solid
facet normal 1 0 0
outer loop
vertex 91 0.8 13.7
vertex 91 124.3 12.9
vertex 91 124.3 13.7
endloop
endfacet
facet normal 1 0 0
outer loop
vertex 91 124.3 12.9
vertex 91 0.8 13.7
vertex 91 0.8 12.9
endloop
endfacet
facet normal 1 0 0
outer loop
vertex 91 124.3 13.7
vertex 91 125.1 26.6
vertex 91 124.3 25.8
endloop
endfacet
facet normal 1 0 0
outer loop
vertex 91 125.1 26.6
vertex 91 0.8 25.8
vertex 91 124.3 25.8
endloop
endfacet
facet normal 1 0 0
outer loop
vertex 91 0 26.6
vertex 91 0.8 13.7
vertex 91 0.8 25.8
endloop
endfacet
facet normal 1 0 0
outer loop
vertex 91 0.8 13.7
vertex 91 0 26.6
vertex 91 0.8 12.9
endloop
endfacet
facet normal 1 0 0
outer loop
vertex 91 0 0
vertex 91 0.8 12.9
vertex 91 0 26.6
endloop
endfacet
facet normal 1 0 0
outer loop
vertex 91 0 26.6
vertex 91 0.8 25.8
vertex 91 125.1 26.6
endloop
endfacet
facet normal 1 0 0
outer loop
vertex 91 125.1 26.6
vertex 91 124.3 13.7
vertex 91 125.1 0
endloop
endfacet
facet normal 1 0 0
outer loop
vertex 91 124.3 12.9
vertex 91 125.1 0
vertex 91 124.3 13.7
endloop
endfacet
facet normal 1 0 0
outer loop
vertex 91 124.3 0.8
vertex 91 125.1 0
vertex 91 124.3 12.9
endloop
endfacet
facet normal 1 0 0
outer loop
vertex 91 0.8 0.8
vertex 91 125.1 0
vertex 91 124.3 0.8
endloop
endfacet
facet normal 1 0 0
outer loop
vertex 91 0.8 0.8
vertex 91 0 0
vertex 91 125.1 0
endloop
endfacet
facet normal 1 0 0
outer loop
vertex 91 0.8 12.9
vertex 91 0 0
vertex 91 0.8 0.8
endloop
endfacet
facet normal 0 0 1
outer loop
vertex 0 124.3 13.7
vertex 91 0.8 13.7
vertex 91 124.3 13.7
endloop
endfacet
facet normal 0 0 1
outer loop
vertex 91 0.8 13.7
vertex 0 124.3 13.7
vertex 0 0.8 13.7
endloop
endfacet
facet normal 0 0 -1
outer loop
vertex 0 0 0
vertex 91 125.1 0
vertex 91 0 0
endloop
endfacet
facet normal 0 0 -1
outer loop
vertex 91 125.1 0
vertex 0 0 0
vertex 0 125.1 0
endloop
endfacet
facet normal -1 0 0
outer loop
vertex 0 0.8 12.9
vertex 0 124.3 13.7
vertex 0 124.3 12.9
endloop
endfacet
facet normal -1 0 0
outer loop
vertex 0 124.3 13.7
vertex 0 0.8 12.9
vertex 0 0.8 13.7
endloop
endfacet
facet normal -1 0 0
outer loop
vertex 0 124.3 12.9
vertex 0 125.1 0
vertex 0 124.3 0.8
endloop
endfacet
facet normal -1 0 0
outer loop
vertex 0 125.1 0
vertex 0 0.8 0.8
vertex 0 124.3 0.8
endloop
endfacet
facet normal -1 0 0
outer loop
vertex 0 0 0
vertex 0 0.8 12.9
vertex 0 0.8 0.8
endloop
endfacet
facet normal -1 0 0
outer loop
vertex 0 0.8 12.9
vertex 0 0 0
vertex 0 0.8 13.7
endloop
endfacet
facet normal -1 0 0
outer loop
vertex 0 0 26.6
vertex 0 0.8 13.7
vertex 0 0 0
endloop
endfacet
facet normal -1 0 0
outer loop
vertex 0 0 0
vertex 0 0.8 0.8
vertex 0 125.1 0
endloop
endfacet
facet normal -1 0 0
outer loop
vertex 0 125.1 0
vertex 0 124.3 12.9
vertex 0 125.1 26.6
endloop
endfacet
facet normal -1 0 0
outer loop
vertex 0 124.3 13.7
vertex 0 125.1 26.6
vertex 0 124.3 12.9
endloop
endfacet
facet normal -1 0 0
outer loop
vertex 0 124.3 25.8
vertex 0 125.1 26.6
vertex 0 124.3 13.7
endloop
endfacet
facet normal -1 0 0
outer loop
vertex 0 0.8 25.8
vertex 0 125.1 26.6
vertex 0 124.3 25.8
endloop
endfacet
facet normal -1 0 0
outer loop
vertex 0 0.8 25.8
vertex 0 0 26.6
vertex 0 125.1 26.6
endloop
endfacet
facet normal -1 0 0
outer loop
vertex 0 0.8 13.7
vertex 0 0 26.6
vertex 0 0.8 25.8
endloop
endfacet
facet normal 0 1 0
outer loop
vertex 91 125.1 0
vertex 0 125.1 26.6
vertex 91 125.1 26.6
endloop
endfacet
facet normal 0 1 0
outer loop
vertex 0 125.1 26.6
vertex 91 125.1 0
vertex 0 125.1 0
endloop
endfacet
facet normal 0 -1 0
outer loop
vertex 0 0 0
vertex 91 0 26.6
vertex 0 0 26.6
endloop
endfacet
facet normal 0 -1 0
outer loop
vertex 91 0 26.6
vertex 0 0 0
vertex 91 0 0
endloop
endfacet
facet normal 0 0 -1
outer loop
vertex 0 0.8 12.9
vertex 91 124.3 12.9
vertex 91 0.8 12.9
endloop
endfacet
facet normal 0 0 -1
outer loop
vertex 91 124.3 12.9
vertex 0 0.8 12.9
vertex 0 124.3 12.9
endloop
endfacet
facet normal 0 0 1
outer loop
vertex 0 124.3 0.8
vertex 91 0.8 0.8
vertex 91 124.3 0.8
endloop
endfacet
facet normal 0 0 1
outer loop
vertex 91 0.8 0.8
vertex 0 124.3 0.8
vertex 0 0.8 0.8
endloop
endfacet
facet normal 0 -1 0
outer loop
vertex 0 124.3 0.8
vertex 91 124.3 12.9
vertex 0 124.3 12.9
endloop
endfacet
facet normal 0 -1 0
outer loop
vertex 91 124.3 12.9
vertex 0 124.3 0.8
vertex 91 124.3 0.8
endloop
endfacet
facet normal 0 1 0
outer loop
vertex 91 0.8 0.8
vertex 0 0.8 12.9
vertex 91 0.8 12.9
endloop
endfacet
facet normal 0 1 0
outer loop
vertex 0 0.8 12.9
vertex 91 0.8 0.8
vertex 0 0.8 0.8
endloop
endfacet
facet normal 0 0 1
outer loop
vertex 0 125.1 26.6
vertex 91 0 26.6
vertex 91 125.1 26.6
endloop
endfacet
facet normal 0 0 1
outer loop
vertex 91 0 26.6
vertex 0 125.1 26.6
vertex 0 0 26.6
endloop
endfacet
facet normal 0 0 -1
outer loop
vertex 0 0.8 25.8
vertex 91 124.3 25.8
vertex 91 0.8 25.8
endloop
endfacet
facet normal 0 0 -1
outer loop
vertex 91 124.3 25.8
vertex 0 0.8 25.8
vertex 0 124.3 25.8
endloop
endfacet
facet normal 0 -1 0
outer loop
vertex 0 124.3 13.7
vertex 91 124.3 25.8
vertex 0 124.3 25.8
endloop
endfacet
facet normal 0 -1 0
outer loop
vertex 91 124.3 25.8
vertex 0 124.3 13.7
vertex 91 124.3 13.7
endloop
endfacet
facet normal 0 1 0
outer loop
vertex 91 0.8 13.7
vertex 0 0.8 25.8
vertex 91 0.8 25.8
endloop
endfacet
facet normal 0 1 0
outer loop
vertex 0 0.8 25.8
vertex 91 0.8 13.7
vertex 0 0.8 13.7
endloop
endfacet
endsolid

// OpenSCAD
/**
 * Box compartments (leave thickness * 2 for optional lids?):
 * - 286x110x60
 * - 286x93x60
 *
 * components
 * - card: 66x92
 * - tile: 100x100
 * - small secret: d = 20, h = 1.5
 * - big secret: d = 27, h = 1.5
 * - coin 1: d = 20, h = 1.5
 * - coin 5: d = 22, h = 1.5
 * - coin 10: d = 26, h = 1.5
 * - shop item, idol: 20x20x1.5
 * - cube: 8x8x8
 * - artifact: hexagon side to side: 27.5
 * - prisoner: pentagon corner to corner: 34.5
 *
 * print settings:
 * - 3mm inner brim
 *
 */

$fn = 32;
clearance = 0.15; // 0.03, 0.05, 0.07
thickness = 0.8; // 2x nozzle width
layer_overlap = 1;
thumb_d = 25;
box_radius = 0;

function polar_to_cartesian(length, angle) = [length * cos(angle), length * sin(angle)];

module filled_box(size, radius) {
  difference() {
    translate([radius, radius, radius]) {
      minkowski() {
        sphere(radius);
        cube([
          size[0] - 2 * radius,
          size[1] - 2 * radius,
          size[2] - radius,
        ]);
      }
    }
    translate([0, 0, size[2]]) {
      cube([
        size[0],
        size[1],
        radius,
      ]);
    }
  }
}

module box(size, radius, thickness = 2) {
  thickness2 = thickness * 2;
  radius2 = radius * 2;

  difference() {
    union() {
      filled_box([size[0], size[1], size[2] - layer_overlap], radius);
      cube(size);
    }
    translate([thickness, thickness, thickness]) {
      filled_box([
        size[0] - thickness2,
        size[1] - thickness2,
        size[2],
      ], radius);
    }
  }
}

module card_box(size, thickness = 2) {
  thickness2 = thickness * 2;

  difference() {
    cube(size);
    translate([thickness, thickness, thickness]) {
      cube([
        size[0] - thickness2,
        size[1] - thickness2,
        size[2],
      ]);
    }
    translate([size[0] / 2, 0, -layer_overlap]) {
      cylinder(d = thumb_d, h = size[2] + layer_overlap * 2);
    }
    translate([size[0] / 2, size[1], -layer_overlap]) {
      cylinder(d = thumb_d, h = size[2] + layer_overlap * 2);
    }
    translate([0, size[1] / 2, -layer_overlap]) {
      cylinder(d = thumb_d, h = size[2] + layer_overlap * 2);
    }
    translate([size[0], size[1] / 2, -layer_overlap]) {
      cylinder(d = thumb_d, h = size[2] + layer_overlap * 2);
    }
  }
}

// tokens
//box([20, 20, 10], 3, thickness);

// player pieces
//union() {
//  card_box([66 + thickness * 2, 92 + thickness * 2, 8 + thickness], thickness);
//  translate([0, 92 + thickness, 0])
//    box([66 + thickness * 2, 49 + thickness * 2, 8 + thickness], box_radius, thickness);
//}

// coins
//box([
//  91,
//  68 + thickness * 2,
//  11 + thickness
//], box_radius, thickness);
//translate([0, 68 + thickness, 0])
//  box([
//    91,
//    24 + thickness * 2,
//    11 + thickness
//  ], box_radius, thickness);
//translate([0, 68 + thickness + 24 + thickness, 0])
//  box([
//    91,
//    28 + thickness * 2,
//    11 + thickness
//  ], box_radius, thickness);

// secrets + prisoners + lockpicks
//box([
//  91,
//  68 + thickness * 2,
//  11 + thickness
//], box_radius, thickness);
//translate([91 - (30 + thickness * 2), 0, 0])
//  box([
//    30 + thickness * 2,
//    68 + thickness * 2,
//    11 + thickness
//  ], box_radius, thickness);
//translate([0, 68 + thickness, 0])
//  box([
//    91,
//    24 + thickness * 2,
//    11 + thickness
//  ], box_radius, thickness);
//translate([0, 68 + thickness + 24 + thickness, 0])
//  box([
//    91,
//    28 + thickness * 2,
//    11 + thickness
//  ], box_radius, thickness);
  
// lid
//difference() {
//  cube([
//    91,
//    68 + thickness + 24 + thickness + 28 + thickness * 2  + thickness * 2 + clearance * 2,
//    thickness + 5
//  ]);
//  translate([0, thickness, thickness])
//    cube([
//      91,
//      68 + thickness + 24 + thickness + 28 + thickness * 2 + clearance * 2,
//      thickness + 5
//    ]);
//}

module shelf() {
  difference() {
    cube([
      91,
      68 + thickness + 24 + thickness + 28 + thickness * 2  + thickness * 2 + clearance * 2,
      11 + thickness * 3 + clearance * 2
    ]);
    translate([0, thickness, thickness])
      cube([
        91,
        68 + thickness + 24 + thickness + 28 + thickness * 2 + clearance * 2,
        11 + thickness + clearance * 2
      ]);
  }
}

shelf();
translate([0, 0, 11 + thickness * 2 + clearance * 2])
  shelf();

module hex_grid(size = [100, 100, 10], d = 10, h = 10, thickness = 2) {
    offset = polar_to_cartesian((sqrt(3) / 2) * d + thickness, 30);
    
    ox = 2;
    oy = 3;
  
    for (row = [0:ox]) {
      for (col = [0:oy]) {
        translate([offset[0] * 2 * col, offset[1] * 2 * row, 0])
          cylinder(d = d, h = h, $fn = 6);
      }
    }

    for (row = [0:ox]) {
      for (col = [0:oy]) {
        translate([offset[0] + offset[0] * (col * 2), offset[1] * (row * 2 + 1), 0])
          cylinder(d = d, h = h, $fn = 6);
      }
    }
}

//difference() {
////  cube([100, 100, 2]);
//  hex_grid(thickness = 2);
//}
